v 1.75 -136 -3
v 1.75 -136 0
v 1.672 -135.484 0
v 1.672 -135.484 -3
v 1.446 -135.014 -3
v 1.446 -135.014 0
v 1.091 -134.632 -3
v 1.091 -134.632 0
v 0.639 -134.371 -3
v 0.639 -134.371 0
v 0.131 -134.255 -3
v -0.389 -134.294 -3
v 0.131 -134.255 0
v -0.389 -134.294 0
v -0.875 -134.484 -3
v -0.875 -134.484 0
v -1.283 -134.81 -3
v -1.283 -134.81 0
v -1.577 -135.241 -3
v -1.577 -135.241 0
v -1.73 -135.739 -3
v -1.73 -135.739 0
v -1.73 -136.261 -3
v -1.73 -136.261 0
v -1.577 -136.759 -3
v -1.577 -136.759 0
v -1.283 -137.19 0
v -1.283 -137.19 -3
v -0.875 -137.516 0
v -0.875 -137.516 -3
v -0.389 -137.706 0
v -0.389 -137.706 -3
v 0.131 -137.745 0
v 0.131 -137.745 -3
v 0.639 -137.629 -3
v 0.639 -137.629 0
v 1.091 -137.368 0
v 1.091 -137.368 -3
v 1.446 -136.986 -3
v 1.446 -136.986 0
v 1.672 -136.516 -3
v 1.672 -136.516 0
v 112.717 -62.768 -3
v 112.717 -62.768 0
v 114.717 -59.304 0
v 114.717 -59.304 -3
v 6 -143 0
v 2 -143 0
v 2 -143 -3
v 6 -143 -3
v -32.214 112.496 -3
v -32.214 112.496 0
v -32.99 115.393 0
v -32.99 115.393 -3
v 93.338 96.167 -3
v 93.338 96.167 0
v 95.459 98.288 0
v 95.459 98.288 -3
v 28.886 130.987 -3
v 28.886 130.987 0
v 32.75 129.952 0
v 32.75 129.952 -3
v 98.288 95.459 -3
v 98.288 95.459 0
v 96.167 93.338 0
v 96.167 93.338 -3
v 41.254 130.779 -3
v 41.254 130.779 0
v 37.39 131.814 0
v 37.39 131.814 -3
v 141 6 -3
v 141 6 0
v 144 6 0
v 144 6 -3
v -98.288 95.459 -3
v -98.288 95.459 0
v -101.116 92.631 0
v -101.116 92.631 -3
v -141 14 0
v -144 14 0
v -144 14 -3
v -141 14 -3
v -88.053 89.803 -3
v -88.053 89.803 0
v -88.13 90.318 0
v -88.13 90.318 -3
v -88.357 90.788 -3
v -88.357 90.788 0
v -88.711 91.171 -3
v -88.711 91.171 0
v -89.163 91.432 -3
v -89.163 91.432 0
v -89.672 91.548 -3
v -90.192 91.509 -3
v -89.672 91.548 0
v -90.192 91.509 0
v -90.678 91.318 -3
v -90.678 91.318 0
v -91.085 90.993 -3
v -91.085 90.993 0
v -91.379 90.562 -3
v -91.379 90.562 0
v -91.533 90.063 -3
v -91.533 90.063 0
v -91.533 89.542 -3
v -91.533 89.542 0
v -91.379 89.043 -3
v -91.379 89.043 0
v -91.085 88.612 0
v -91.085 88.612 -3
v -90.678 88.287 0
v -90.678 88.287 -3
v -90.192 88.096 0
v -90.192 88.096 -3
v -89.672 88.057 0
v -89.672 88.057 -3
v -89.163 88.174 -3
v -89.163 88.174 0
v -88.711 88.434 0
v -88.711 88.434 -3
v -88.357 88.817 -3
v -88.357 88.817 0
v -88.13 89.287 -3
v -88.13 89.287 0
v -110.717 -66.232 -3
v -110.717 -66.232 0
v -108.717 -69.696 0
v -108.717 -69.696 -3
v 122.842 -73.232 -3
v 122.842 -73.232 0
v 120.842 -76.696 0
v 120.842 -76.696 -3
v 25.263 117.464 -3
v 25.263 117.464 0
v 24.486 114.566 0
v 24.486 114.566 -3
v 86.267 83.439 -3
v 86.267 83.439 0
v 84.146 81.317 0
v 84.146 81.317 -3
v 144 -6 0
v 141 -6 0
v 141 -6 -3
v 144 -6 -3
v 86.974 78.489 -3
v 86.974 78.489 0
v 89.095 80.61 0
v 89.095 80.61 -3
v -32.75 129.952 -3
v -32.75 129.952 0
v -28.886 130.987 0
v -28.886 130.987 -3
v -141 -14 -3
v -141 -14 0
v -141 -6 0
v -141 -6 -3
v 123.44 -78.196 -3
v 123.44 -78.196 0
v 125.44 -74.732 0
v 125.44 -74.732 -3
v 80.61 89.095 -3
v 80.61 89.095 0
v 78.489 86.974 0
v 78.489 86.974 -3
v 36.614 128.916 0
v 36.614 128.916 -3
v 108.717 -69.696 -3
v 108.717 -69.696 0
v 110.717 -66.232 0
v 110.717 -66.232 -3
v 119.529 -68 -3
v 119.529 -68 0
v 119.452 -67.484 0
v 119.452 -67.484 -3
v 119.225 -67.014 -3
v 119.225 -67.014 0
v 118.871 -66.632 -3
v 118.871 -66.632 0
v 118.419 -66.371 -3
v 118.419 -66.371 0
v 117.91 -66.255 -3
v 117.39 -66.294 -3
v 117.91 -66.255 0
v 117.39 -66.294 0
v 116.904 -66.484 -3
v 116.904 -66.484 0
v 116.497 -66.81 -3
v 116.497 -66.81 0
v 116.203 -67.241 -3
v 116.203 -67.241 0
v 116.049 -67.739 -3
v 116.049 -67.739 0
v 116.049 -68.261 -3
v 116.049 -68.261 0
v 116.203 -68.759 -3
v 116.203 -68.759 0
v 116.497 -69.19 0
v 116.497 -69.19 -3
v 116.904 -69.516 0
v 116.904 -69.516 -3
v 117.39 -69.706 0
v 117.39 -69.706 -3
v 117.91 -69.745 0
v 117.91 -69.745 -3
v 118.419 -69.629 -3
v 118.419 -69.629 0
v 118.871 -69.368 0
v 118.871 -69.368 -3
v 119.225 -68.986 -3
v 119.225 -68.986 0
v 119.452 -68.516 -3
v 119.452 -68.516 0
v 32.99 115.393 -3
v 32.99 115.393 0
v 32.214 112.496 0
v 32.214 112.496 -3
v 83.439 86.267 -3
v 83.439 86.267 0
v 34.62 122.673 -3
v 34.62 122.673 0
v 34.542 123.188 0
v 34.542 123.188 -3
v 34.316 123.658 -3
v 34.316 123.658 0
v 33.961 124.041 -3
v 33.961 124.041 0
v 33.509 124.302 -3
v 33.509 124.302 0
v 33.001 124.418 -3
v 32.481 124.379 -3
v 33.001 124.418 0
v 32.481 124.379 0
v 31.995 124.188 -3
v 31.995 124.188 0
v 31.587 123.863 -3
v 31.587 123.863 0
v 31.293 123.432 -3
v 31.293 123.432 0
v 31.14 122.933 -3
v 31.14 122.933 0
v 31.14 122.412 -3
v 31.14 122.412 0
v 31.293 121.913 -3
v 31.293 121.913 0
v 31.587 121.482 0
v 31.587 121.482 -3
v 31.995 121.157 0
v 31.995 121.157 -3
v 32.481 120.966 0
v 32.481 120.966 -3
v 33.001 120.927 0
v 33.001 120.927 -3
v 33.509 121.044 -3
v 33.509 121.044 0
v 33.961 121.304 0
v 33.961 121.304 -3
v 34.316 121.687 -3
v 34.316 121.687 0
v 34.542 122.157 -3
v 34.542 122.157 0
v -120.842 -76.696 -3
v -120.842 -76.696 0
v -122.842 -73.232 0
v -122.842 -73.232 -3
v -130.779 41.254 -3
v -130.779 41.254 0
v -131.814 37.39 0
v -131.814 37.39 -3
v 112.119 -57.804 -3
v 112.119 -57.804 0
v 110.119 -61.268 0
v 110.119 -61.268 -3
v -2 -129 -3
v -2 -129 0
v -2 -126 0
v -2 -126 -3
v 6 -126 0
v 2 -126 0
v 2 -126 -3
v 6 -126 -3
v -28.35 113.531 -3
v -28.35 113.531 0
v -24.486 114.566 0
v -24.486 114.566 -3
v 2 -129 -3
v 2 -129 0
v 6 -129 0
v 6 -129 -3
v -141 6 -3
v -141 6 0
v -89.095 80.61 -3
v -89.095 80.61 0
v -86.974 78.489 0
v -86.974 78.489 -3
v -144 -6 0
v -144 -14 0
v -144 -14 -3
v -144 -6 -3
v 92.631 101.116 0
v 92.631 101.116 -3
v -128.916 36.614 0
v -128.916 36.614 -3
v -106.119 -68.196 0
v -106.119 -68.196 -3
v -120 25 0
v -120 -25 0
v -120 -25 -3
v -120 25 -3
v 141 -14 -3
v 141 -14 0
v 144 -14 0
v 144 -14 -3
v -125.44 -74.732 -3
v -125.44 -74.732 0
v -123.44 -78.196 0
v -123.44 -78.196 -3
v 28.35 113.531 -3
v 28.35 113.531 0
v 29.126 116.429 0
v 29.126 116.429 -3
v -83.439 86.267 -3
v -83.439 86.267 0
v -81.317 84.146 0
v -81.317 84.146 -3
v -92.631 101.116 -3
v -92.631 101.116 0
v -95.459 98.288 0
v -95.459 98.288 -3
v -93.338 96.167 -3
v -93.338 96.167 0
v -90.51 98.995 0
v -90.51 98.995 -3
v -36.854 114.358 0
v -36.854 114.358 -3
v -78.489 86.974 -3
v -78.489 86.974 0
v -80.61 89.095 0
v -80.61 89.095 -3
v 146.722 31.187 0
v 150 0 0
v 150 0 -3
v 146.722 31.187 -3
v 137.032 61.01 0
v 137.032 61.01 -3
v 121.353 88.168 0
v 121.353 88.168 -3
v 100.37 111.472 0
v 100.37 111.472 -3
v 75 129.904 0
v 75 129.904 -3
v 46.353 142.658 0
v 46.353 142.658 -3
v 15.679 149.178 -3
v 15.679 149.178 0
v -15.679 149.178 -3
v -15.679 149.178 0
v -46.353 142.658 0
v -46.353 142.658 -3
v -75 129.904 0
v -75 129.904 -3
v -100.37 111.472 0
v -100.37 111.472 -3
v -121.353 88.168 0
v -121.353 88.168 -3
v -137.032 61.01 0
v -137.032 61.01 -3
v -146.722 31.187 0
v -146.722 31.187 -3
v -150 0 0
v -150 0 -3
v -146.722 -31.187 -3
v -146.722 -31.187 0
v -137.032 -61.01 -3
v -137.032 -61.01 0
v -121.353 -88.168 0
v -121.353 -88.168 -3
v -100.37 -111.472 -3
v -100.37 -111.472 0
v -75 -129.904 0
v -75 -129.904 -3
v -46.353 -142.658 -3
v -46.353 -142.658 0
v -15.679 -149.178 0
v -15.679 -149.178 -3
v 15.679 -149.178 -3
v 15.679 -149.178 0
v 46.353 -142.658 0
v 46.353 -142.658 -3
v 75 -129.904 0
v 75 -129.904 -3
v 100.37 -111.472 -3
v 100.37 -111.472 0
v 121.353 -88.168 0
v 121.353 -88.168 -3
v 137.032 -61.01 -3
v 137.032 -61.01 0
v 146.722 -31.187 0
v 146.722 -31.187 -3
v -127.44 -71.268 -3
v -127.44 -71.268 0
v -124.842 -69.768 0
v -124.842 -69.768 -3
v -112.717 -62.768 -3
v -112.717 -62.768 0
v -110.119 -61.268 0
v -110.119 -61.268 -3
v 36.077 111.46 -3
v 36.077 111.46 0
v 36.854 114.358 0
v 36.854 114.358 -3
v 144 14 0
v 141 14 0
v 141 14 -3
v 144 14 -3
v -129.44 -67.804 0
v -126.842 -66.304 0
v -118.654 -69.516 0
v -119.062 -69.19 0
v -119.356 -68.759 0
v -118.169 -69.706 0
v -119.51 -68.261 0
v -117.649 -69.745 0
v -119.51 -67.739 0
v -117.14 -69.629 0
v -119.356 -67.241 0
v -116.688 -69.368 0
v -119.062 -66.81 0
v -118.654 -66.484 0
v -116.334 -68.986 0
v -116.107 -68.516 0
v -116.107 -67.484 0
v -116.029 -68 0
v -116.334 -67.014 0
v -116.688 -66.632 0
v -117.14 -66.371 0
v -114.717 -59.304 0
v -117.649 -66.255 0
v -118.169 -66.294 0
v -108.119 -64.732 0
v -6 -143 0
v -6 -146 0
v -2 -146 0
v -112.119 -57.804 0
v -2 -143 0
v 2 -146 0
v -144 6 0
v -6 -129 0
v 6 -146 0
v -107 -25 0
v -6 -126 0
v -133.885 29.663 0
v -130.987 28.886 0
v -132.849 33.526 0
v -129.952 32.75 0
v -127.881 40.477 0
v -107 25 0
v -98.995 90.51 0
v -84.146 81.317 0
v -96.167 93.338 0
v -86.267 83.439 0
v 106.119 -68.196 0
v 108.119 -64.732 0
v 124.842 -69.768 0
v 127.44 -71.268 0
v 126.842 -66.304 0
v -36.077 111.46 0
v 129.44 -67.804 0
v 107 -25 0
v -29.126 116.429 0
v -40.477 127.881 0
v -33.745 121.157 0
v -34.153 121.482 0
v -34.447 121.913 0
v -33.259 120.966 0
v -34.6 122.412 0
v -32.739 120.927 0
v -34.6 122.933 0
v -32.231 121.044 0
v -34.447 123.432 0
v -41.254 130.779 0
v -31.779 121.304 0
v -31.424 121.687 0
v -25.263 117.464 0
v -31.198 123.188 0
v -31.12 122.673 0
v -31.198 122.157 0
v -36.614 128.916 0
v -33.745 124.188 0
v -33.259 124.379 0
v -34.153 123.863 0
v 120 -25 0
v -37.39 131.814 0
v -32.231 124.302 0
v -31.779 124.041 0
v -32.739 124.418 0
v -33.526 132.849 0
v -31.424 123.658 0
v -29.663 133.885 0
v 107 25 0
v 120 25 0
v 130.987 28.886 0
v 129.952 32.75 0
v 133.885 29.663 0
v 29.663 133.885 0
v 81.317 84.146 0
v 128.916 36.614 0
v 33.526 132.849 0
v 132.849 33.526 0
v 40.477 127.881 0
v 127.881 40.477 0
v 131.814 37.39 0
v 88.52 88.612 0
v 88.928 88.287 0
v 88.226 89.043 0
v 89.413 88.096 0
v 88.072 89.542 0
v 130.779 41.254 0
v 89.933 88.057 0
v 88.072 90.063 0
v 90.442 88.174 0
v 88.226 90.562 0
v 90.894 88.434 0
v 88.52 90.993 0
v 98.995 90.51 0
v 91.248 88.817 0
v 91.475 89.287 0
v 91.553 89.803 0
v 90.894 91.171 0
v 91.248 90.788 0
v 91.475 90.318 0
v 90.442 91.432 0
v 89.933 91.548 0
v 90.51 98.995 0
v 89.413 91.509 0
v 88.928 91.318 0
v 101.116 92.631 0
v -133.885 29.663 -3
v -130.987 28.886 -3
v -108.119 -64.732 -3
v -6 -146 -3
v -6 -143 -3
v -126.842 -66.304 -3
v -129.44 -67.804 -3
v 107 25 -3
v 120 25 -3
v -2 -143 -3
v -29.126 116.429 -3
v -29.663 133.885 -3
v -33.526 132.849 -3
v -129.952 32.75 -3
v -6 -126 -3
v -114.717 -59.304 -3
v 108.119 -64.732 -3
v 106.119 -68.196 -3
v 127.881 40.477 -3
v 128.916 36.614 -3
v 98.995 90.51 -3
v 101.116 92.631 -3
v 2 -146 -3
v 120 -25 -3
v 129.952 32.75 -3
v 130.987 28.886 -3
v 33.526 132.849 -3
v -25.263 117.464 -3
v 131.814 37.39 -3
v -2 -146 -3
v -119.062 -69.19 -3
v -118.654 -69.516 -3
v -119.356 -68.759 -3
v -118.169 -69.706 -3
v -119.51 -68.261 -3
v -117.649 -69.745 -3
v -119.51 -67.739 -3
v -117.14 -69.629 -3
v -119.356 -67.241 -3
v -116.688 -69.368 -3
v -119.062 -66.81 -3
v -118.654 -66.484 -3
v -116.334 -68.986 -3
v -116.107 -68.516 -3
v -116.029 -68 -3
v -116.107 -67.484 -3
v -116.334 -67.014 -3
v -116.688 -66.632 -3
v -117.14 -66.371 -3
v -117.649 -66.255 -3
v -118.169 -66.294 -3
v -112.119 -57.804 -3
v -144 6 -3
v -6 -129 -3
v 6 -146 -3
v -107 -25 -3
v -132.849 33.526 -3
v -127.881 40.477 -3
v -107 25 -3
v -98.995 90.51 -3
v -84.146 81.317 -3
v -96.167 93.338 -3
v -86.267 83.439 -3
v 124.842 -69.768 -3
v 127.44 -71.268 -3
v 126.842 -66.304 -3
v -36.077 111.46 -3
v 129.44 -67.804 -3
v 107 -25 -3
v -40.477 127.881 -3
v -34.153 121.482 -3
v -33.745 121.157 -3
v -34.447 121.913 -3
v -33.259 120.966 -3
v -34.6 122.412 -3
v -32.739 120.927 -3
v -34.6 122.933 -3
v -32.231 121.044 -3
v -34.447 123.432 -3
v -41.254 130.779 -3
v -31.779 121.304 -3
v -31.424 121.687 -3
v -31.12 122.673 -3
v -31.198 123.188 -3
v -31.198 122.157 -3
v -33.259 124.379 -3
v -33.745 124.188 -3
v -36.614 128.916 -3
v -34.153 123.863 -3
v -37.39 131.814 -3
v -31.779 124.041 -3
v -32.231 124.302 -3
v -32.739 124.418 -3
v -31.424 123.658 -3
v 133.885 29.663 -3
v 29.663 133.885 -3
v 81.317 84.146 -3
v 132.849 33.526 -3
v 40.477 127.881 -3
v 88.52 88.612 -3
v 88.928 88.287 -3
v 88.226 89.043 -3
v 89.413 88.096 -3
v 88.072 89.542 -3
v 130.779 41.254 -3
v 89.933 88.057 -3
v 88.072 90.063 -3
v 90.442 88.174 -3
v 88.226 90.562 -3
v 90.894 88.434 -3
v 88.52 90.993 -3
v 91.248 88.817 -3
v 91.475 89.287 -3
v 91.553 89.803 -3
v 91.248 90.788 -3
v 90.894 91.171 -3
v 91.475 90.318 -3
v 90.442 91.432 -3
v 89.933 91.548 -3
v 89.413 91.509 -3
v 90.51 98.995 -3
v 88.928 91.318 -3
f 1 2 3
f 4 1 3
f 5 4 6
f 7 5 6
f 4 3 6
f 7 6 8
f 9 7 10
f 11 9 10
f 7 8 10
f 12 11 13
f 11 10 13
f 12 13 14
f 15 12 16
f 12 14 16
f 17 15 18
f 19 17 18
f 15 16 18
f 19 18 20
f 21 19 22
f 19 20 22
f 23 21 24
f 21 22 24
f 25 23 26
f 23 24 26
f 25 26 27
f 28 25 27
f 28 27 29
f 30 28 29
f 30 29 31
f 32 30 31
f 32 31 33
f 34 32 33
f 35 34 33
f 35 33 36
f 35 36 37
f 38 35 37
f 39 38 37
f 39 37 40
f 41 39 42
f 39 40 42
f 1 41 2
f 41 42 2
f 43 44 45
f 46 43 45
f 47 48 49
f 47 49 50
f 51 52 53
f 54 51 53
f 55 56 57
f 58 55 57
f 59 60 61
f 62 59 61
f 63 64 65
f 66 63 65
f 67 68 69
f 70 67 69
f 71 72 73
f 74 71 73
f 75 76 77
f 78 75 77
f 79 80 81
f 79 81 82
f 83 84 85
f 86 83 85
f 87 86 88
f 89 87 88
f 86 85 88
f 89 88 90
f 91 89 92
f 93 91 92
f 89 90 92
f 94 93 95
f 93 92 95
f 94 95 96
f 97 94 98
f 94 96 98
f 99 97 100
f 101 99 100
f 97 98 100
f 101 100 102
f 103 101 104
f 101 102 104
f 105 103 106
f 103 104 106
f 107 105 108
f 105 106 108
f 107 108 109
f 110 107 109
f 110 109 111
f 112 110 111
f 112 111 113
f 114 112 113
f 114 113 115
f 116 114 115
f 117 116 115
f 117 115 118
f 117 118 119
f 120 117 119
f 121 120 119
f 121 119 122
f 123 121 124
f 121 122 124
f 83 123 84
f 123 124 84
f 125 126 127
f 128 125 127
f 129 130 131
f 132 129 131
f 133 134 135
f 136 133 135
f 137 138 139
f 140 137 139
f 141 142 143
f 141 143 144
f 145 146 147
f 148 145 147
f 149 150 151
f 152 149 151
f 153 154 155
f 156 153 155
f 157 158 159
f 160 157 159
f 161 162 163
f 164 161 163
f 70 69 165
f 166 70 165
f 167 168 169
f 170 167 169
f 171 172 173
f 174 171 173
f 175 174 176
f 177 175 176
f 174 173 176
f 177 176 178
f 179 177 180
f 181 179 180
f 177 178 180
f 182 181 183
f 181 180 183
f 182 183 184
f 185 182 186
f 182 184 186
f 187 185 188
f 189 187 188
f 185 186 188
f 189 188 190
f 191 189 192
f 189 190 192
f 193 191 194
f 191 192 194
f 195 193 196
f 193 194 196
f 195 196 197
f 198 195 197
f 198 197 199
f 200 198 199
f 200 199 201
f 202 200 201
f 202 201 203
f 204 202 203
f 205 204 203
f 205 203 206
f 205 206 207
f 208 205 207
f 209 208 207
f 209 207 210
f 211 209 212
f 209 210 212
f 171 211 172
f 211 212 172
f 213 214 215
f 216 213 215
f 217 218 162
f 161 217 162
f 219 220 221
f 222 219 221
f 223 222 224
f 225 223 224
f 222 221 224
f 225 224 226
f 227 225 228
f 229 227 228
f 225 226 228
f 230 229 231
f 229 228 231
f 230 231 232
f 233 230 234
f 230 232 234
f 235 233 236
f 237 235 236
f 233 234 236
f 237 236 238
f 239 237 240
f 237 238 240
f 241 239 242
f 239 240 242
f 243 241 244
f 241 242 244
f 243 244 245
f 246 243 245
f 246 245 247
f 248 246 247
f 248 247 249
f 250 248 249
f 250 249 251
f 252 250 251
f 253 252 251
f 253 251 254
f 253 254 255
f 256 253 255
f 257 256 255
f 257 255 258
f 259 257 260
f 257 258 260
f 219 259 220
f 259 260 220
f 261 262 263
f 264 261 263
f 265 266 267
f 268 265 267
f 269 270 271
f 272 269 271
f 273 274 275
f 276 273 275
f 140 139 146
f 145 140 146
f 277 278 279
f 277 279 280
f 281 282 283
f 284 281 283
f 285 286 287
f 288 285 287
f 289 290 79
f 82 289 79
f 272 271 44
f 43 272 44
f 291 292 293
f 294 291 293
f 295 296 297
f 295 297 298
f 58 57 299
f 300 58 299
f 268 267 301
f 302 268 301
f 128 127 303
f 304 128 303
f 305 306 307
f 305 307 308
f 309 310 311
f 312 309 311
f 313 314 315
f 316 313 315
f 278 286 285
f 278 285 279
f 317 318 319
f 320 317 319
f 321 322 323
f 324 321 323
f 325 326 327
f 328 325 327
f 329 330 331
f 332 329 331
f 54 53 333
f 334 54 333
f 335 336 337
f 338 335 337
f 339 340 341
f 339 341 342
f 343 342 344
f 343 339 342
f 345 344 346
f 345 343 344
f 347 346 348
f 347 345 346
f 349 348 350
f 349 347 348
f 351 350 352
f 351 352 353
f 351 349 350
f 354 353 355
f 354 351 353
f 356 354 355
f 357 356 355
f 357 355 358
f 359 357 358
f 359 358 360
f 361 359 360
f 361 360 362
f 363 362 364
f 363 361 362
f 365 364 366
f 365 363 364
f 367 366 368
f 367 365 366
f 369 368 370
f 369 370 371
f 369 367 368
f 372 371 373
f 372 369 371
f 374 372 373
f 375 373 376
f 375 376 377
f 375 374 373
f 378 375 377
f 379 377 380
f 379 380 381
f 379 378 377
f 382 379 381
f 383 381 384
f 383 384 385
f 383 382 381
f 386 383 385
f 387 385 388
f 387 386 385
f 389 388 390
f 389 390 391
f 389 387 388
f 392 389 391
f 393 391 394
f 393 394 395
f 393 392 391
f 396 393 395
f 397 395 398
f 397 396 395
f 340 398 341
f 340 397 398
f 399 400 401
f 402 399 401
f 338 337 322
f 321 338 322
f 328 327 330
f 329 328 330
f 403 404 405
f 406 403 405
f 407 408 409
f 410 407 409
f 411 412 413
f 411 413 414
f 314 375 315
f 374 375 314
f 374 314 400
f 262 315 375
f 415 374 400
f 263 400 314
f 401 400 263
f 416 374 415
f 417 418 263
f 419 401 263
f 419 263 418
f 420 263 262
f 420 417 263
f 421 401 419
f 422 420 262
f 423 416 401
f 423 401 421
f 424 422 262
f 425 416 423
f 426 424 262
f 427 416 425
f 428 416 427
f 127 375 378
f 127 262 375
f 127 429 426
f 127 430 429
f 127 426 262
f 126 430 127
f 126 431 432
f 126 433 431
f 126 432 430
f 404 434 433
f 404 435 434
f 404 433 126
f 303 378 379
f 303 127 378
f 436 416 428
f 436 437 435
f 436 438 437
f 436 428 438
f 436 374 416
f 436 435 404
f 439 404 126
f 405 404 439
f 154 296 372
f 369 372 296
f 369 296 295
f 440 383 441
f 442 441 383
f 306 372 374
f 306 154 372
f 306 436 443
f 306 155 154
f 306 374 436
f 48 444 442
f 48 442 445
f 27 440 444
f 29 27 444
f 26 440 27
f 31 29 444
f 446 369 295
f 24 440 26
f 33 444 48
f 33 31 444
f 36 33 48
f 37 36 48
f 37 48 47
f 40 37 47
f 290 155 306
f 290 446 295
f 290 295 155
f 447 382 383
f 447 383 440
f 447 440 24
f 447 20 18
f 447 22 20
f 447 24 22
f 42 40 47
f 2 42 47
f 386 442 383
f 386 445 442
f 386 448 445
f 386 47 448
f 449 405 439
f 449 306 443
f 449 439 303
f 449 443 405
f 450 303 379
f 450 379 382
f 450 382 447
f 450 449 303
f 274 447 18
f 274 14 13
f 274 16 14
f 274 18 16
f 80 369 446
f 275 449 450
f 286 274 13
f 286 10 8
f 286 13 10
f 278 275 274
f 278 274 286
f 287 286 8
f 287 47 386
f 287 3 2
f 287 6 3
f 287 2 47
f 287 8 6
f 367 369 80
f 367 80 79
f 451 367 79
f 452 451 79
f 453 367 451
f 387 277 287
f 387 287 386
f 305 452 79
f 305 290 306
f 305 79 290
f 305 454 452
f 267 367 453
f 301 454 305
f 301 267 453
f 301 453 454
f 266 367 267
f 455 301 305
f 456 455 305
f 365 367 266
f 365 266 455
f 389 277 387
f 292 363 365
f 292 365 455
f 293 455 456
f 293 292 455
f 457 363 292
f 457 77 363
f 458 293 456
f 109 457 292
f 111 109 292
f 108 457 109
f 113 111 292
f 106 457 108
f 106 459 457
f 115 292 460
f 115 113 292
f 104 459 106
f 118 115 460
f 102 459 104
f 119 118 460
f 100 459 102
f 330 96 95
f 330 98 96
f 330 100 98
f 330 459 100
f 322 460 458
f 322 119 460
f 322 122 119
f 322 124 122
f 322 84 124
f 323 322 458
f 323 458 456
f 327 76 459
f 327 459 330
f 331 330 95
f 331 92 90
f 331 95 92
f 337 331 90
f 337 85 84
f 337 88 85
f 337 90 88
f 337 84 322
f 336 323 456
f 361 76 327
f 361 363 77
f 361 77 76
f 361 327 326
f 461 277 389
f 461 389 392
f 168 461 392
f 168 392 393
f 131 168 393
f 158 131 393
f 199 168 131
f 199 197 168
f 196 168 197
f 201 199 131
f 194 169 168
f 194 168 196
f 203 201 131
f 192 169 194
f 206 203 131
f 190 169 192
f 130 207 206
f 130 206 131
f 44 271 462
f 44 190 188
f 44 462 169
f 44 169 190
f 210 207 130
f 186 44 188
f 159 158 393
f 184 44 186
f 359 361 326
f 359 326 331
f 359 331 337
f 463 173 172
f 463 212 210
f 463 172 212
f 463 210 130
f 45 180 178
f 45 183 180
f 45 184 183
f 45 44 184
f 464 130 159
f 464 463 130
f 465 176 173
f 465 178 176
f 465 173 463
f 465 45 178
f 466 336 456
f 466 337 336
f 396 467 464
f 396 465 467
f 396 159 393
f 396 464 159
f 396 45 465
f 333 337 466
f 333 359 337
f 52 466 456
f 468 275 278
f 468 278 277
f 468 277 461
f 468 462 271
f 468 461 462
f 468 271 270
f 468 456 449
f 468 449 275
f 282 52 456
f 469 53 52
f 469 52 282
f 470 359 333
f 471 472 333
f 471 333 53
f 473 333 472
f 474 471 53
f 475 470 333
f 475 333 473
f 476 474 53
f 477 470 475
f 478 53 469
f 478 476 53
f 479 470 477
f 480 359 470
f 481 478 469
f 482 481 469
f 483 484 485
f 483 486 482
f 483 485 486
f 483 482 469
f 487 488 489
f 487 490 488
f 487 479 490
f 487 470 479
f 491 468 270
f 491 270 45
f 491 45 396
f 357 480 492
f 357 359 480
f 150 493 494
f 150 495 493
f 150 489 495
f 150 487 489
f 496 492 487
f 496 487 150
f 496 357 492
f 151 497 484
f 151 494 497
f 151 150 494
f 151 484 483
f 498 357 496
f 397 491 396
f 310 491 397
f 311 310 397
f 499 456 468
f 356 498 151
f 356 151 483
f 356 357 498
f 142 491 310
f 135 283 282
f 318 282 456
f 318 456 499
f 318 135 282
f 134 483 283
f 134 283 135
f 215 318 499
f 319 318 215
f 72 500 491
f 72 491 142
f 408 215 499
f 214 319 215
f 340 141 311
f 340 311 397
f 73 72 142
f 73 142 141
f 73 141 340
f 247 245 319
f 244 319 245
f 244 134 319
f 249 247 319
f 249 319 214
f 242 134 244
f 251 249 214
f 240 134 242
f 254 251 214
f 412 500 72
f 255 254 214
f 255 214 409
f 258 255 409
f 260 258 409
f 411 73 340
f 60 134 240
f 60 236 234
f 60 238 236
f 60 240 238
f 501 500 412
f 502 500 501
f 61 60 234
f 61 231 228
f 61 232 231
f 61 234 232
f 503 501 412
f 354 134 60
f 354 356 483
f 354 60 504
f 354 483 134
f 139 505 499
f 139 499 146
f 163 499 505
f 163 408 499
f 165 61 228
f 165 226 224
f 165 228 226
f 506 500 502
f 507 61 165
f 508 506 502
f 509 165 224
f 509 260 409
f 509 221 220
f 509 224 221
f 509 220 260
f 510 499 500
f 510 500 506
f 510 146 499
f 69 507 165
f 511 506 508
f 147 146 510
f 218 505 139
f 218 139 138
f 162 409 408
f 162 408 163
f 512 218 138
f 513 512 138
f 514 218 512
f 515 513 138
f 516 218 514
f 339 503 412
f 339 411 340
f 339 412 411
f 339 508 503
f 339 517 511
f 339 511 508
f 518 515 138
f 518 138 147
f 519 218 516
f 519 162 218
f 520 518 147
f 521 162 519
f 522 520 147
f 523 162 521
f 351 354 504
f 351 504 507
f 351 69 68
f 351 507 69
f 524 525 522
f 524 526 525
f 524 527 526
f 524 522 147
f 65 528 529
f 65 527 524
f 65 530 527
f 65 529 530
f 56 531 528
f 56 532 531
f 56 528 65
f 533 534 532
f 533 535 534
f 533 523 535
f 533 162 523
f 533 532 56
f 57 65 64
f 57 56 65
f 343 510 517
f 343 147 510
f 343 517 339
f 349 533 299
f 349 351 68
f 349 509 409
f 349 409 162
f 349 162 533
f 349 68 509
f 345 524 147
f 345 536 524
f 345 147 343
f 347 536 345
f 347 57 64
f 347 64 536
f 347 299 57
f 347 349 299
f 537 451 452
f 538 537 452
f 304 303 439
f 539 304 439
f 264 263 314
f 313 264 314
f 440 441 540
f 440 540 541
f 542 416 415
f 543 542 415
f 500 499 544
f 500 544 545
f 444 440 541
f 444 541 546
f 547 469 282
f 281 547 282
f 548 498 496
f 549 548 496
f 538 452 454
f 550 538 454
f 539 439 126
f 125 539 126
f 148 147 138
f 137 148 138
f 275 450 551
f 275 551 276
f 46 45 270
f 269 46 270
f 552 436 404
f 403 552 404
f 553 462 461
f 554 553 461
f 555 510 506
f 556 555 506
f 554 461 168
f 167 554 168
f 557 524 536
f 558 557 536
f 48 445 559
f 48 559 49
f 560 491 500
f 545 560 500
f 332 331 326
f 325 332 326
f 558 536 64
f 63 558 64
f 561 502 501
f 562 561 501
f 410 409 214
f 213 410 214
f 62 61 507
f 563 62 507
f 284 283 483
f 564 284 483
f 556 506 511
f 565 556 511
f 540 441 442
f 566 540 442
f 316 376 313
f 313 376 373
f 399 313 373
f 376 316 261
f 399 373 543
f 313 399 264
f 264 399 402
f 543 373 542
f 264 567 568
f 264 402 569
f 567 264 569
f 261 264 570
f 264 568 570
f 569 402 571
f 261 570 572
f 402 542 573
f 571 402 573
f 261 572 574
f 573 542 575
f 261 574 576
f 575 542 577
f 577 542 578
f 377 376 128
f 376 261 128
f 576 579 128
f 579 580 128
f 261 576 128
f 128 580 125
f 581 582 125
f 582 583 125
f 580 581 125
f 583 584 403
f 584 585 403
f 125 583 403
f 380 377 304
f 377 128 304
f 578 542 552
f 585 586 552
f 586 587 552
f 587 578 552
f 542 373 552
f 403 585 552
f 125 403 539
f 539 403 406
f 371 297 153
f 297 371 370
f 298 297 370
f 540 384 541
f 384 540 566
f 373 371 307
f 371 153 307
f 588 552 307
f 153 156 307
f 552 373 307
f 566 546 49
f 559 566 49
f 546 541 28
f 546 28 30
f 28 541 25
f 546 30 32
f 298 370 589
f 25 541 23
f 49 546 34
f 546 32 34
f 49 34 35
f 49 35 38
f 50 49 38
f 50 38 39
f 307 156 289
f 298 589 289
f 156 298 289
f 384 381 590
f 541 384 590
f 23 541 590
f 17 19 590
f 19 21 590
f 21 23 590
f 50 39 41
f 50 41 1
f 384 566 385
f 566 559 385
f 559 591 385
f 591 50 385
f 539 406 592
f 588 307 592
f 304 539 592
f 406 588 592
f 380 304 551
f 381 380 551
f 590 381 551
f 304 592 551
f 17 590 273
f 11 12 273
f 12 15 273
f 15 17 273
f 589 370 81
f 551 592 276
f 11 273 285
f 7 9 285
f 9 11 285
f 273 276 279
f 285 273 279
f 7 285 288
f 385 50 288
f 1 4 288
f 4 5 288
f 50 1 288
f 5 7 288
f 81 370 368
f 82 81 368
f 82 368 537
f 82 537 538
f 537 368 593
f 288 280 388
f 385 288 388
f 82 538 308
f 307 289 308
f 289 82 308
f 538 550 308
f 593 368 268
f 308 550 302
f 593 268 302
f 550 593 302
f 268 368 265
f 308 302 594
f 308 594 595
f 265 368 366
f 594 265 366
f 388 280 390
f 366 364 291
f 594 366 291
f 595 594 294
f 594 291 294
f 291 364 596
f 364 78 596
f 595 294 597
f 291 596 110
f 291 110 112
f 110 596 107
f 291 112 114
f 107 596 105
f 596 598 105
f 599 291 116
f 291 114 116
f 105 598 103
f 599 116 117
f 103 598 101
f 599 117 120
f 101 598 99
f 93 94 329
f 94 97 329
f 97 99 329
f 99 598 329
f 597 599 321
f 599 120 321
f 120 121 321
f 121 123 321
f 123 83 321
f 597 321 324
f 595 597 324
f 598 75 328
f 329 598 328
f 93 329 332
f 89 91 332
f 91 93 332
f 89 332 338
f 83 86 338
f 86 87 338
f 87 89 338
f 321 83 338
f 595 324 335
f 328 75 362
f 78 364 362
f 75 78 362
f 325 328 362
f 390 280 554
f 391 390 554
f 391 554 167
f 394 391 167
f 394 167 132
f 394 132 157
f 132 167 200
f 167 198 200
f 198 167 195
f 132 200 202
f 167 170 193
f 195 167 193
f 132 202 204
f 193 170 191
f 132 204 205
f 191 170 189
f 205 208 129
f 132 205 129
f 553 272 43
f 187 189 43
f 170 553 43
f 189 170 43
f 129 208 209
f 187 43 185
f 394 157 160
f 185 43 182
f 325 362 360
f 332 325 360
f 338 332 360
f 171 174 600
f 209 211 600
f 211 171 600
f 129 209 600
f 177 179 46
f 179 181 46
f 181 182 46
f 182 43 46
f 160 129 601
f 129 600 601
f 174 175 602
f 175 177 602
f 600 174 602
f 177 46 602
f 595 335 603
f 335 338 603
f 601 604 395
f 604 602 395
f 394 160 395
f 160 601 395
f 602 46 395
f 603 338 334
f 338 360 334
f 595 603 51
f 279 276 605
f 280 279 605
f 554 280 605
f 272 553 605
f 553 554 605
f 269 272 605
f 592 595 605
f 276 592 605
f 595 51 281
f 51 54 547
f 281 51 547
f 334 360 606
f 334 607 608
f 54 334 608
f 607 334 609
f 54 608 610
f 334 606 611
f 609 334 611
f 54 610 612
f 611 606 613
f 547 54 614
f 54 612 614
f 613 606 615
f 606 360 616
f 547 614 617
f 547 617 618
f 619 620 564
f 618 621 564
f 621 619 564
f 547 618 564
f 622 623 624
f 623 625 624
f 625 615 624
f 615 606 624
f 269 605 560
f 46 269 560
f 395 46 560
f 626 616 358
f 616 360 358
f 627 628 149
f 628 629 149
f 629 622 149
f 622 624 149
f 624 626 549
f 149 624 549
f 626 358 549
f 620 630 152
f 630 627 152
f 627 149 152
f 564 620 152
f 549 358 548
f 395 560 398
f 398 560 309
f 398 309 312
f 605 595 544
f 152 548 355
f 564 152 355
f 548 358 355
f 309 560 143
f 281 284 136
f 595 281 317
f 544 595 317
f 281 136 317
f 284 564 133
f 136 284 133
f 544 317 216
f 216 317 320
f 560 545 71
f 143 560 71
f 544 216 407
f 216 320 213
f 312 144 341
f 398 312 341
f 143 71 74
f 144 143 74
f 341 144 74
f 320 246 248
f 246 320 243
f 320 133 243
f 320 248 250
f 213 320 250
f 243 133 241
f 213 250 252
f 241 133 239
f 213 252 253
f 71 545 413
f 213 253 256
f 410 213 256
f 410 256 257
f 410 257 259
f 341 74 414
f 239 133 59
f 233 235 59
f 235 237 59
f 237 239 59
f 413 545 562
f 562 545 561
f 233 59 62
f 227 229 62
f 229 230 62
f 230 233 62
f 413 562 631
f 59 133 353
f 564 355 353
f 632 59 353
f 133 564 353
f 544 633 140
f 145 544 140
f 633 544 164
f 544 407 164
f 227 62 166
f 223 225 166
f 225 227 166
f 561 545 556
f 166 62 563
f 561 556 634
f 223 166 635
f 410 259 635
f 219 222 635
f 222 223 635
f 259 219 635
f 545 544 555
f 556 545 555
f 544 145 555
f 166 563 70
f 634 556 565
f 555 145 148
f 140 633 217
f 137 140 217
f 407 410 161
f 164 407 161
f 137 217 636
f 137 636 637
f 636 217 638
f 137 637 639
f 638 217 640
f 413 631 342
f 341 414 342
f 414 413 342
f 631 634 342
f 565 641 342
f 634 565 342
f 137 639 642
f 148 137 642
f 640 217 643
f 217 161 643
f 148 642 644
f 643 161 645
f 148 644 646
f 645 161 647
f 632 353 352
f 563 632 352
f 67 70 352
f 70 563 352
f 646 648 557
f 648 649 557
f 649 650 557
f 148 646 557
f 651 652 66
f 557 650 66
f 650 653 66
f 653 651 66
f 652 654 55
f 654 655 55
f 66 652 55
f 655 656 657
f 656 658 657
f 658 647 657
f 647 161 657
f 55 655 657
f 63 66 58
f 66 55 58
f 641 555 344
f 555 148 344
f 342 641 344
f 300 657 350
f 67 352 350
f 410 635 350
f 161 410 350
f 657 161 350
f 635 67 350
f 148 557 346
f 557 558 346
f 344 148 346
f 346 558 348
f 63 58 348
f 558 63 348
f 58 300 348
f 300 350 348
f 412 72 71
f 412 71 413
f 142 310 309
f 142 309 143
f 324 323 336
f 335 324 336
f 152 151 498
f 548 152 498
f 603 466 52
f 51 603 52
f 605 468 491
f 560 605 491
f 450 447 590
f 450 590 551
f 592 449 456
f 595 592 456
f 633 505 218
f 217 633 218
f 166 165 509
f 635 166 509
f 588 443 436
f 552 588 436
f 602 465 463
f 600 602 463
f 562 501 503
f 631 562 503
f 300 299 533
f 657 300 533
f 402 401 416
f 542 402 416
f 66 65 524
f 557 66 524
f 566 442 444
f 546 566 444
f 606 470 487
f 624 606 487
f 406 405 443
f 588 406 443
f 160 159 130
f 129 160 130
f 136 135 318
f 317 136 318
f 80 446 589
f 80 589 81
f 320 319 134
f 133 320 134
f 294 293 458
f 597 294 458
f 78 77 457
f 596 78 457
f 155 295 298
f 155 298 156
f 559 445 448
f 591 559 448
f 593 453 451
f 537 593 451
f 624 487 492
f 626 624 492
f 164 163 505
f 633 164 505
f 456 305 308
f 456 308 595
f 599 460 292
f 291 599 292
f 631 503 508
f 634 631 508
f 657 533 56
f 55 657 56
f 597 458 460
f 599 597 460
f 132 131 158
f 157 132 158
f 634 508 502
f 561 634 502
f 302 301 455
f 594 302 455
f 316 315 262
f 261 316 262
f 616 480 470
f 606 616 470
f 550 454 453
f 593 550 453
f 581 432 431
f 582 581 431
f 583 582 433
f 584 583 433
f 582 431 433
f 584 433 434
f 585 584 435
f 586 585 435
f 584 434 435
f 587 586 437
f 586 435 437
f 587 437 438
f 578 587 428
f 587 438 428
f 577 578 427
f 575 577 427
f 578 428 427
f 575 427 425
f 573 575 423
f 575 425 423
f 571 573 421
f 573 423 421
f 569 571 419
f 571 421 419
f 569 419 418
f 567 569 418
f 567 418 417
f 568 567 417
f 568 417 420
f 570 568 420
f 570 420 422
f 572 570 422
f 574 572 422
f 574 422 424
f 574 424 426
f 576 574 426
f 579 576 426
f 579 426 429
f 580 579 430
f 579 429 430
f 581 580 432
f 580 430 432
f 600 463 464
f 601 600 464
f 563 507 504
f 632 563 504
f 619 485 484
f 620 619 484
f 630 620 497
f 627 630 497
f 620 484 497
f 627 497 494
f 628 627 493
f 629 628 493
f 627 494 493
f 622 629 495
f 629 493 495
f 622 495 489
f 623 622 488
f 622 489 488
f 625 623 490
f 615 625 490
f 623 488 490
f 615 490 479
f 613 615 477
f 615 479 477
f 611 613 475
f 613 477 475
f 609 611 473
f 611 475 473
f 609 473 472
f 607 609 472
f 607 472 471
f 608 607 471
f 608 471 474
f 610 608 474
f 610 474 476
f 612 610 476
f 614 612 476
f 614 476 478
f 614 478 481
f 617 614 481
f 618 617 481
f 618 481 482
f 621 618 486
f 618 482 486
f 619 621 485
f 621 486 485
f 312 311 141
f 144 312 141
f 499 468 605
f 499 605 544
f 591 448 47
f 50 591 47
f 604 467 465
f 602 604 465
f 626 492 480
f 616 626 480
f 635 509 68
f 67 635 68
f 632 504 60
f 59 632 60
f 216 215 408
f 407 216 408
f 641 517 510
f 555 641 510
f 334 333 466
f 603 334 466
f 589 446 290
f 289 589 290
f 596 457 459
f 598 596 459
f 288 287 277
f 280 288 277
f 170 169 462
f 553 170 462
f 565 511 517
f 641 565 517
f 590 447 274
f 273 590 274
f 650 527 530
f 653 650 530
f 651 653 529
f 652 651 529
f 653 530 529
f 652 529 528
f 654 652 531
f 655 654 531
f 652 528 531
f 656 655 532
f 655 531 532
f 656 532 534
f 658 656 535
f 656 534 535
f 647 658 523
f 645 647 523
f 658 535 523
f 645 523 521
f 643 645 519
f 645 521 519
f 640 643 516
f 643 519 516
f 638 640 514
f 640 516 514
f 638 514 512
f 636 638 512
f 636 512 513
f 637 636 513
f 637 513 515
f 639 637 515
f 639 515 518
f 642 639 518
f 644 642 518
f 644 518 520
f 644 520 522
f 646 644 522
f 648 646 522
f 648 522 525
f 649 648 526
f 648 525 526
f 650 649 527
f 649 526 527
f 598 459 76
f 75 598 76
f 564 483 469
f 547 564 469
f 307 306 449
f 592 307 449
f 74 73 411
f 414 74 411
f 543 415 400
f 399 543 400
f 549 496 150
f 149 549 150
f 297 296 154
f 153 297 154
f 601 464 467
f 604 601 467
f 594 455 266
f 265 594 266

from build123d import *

# Parameters (mm, degrees)
F0_R     = 150
F0_W     = 3
F0_H     = 8
F0_W_2   = 13
F0_H_2   = 50
F1_DEPTH = 3
F2_R     = 1.75
F2_W     = 4
F2_H     = 3
F3_DEPTH = 3


with BuildPart() as f1:
    # F0 (on Top) → F1 (new body)
    with BuildSketch(Plane.XY):
        Circle(F0_R)
        with Locations((-142.5, -10)):
            Rectangle(F0_W, F0_H, mode=Mode.SUBTRACT)
        with Locations((142.5, -10)):
            Rectangle(F0_W, F0_H, mode=Mode.SUBTRACT)
        with Locations((-142.5, 10)):
            Rectangle(F0_W, F0_H, mode=Mode.SUBTRACT)
        with Locations((-113.5, 0)):
            Rectangle(F0_W_2, F0_H_2, mode=Mode.SUBTRACT)
        with Locations((113.5, 0)):
            Rectangle(F0_W_2, F0_H_2, mode=Mode.SUBTRACT)
        with Locations((142.5, 10)):
            Rectangle(F0_W, F0_H, mode=Mode.SUBTRACT)
    extrude(amount=-F1_DEPTH)

    # F2 (on face) → F3 (cut, through all)
    with BuildSketch(Plane.XY):
        Polygon((-37.390061, 131.8142), (-41.253764, 130.778924), (-40.477307, 127.881146), (-36.613604, 128.916423), align=None)
        Polygon((-32.21368, 112.495684), (-32.990137, 115.393461), (-36.85384, 114.358185), (-36.077383, 111.460407), align=None)
        with Locations((-32.870019, 122.67258)):
            Circle(F2_R)
        Polygon((-28.886197, 130.986975), (-29.662654, 133.884752), (-33.526358, 132.849476), (-32.7499, 129.951699), align=None)
        Polygon((-25.26273, 117.464013), (-29.126434, 116.428737), (-28.349977, 113.53096), (-24.486273, 114.566236), align=None)
        with Locations((-117.779455, -68)):
            Circle(F2_R)
        Polygon((-108.119201, -64.732051), (-110.717277, -66.232051), (-108.717277, -69.696152), (-106.119201, -68.196152), align=None)
        Polygon((-120.841633, -76.696152), (-122.841633, -73.232051), (-125.439709, -74.732051), (-123.439709, -78.196152), align=None)
        Polygon((-114.717277, -59.303848), (-112.717277, -62.767949), (-110.119201, -61.267949), (-112.119201, -57.803848), align=None)
        Polygon((-127.439709, -71.267949), (-124.841633, -69.767949), (-126.841633, -66.303848), (-129.439709, -67.803848), align=None)
        Polygon((108.717277, -69.696152), (110.717277, -66.232051), (108.119201, -64.732051), (106.119201, -68.196152), align=None)
        Polygon((127.439709, -71.267949), (129.439709, -67.803848), (126.841633, -66.303848), (124.841633, -69.767949), align=None)
        Polygon((112.717277, -62.767949), (114.717277, -59.303848), (112.119201, -57.803848), (110.119201, -61.267949), align=None)
        with Locations((117.779455, -68)):
            Circle(F2_R)
        Polygon((123.439709, -78.196152), (125.439709, -74.732051), (122.841633, -73.232051), (120.841633, -76.696152), align=None)
        with Locations((0, -136)):
            Circle(F2_R)
        with Locations((4, -127.5)):
            Rectangle(F2_W, F2_H)
        with Locations((-4, -127.5)):
            Rectangle(F2_W, F2_H)
        with Locations((4, -144.5)):
            Rectangle(F2_W, F2_H)
        with Locations((-4, -144.5)):
            Rectangle(F2_W, F2_H)
        Polygon((-89.095454, 80.610173), (-86.974134, 78.488853), (-84.145707, 81.31728), (-86.267027, 83.4386), align=None)
        Polygon((-80.610173, 89.095454), (-83.4386, 86.267027), (-81.31728, 84.145707), (-78.488853, 86.974134), align=None)
        with Locations((-89.802561, 89.802561)):
            Circle(F2_R)
        Polygon((-101.11627, 92.630988), (-98.994949, 90.509668), (-96.166522, 93.338095), (-98.287843, 95.459415), align=None)
        Polygon((-95.459415, 98.287843), (-93.338095, 96.166522), (-90.509668, 98.994949), (-92.630988, 101.11627), align=None)
        Polygon((-133.884752, 29.662654), (-130.986975, 28.886197), (-129.951699, 32.7499), (-132.849476, 33.526358), align=None)
        Polygon((-130.778924, 41.253764), (-131.8142, 37.390061), (-128.916423, 36.613604), (-127.881146, 40.477307), align=None)
        Polygon((33.526358, 132.849476), (29.662654, 133.884752), (28.886197, 130.986975), (32.7499, 129.951699), align=None)
        Polygon((40.477307, 127.881146), (41.253764, 130.778924), (37.390061, 131.8142), (36.613604, 128.916423), align=None)
        Polygon((28.349977, 113.53096), (29.126434, 116.428737), (25.26273, 117.464013), (24.486273, 114.566236), align=None)
        Polygon((36.85384, 114.358185), (32.990137, 115.393461), (32.21368, 112.495684), (36.077383, 111.460407), align=None)
        with Locations((32.870019, 122.67258)):
            Circle(F2_R)
        Polygon((93.338095, 96.166522), (95.459415, 98.287843), (92.630988, 101.11627), (90.509668, 98.994949), align=None)
        Polygon((101.11627, 92.630988), (98.287843, 95.459415), (96.166522, 93.338095), (98.994949, 90.509668), align=None)
        Polygon((83.4386, 86.267027), (80.610173, 89.095454), (78.488853, 86.974134), (81.31728, 84.145707), align=None)
        Polygon((89.095454, 80.610173), (86.267027, 83.4386), (84.145707, 81.31728), (86.974134, 78.488853), align=None)
        with Locations((89.802561, 89.802561)):
            Circle(F2_R)
        Polygon((130.778924, 41.253764), (127.881146, 40.477307), (128.916423, 36.613604), (131.8142, 37.390061), align=None)
        Polygon((133.884752, 29.662654), (132.849476, 33.526358), (129.951699, 32.7499), (130.986975, 28.886197), align=None)
    extrude(amount=-F3_DEPTH, mode=Mode.SUBTRACT)


solid = f1.part
